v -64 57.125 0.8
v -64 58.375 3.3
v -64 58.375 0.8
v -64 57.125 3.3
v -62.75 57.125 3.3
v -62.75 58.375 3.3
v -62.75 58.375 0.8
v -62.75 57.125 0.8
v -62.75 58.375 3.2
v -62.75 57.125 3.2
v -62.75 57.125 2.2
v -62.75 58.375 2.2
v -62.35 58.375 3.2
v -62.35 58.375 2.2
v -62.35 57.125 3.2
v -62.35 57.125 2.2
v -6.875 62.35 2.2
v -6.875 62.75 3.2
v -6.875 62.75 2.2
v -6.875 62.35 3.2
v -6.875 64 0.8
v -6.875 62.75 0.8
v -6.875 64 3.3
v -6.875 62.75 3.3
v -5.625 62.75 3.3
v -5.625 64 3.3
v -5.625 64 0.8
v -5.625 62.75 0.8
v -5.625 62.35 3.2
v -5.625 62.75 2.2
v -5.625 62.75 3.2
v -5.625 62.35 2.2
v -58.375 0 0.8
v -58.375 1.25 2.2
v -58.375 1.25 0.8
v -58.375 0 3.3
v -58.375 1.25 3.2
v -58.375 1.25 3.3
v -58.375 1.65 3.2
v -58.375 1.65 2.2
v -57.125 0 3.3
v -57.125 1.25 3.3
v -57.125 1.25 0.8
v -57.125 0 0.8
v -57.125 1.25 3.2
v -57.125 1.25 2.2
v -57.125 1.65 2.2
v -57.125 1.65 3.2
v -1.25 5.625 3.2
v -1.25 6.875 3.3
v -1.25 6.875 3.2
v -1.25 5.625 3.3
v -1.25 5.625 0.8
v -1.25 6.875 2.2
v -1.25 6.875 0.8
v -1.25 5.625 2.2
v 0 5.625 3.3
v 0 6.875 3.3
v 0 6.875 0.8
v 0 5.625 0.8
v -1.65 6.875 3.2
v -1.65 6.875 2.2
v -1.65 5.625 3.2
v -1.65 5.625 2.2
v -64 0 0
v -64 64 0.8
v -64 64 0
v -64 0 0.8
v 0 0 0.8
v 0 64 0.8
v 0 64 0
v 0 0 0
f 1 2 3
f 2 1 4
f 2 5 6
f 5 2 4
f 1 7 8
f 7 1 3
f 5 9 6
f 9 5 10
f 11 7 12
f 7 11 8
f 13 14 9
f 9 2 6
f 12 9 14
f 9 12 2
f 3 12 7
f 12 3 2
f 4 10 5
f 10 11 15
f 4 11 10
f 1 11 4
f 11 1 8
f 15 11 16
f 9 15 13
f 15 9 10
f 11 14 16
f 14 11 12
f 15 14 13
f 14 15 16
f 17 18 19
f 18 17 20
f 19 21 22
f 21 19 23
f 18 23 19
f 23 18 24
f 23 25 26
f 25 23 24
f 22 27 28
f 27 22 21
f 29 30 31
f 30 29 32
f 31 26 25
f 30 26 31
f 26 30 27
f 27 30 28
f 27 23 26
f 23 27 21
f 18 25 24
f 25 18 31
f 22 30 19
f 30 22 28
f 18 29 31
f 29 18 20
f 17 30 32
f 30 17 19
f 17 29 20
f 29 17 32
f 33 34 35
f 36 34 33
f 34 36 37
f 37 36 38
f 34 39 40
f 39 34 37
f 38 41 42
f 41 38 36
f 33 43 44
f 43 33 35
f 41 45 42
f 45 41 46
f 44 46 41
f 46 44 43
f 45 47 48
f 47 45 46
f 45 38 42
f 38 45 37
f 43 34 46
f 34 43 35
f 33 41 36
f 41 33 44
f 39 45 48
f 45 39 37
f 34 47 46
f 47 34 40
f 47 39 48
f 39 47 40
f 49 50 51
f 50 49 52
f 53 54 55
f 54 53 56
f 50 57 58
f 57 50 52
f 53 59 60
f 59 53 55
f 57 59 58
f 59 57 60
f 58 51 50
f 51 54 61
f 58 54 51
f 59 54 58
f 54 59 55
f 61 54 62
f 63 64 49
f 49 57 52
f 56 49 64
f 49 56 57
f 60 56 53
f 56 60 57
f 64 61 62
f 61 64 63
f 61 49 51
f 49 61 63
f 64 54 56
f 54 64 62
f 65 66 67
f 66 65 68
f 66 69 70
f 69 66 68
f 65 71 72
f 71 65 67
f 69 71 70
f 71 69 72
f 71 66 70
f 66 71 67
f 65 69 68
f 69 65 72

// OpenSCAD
mirror() {
    translate([62.75,62.75-5.625,.8]) {
    cube([1.25,1.25,2.5]);
    translate([-.4,0,1.4])
        cube([.4,1.25,1]);
    }

    translate([5.625,62.75,.8]) {
    cube([1.25,1.25,2.5]);
    translate([0,-.4,1.4])
        cube([1.25,.4,1]);
    }

    translate([62.75-5.625,0,.8]) {
    cube([1.25,1.25,2.5]);
    translate([0,1.25,1.4])
        cube([1.25,.4,1]);
    }


    translate([0,5.625,.8]) {
    cube([1.25,1.25,2.5]);
    translate([1.25,0,1.4])
        cube([.4,1.25,1]);
    }

    cube([64,64,.8]);
}
